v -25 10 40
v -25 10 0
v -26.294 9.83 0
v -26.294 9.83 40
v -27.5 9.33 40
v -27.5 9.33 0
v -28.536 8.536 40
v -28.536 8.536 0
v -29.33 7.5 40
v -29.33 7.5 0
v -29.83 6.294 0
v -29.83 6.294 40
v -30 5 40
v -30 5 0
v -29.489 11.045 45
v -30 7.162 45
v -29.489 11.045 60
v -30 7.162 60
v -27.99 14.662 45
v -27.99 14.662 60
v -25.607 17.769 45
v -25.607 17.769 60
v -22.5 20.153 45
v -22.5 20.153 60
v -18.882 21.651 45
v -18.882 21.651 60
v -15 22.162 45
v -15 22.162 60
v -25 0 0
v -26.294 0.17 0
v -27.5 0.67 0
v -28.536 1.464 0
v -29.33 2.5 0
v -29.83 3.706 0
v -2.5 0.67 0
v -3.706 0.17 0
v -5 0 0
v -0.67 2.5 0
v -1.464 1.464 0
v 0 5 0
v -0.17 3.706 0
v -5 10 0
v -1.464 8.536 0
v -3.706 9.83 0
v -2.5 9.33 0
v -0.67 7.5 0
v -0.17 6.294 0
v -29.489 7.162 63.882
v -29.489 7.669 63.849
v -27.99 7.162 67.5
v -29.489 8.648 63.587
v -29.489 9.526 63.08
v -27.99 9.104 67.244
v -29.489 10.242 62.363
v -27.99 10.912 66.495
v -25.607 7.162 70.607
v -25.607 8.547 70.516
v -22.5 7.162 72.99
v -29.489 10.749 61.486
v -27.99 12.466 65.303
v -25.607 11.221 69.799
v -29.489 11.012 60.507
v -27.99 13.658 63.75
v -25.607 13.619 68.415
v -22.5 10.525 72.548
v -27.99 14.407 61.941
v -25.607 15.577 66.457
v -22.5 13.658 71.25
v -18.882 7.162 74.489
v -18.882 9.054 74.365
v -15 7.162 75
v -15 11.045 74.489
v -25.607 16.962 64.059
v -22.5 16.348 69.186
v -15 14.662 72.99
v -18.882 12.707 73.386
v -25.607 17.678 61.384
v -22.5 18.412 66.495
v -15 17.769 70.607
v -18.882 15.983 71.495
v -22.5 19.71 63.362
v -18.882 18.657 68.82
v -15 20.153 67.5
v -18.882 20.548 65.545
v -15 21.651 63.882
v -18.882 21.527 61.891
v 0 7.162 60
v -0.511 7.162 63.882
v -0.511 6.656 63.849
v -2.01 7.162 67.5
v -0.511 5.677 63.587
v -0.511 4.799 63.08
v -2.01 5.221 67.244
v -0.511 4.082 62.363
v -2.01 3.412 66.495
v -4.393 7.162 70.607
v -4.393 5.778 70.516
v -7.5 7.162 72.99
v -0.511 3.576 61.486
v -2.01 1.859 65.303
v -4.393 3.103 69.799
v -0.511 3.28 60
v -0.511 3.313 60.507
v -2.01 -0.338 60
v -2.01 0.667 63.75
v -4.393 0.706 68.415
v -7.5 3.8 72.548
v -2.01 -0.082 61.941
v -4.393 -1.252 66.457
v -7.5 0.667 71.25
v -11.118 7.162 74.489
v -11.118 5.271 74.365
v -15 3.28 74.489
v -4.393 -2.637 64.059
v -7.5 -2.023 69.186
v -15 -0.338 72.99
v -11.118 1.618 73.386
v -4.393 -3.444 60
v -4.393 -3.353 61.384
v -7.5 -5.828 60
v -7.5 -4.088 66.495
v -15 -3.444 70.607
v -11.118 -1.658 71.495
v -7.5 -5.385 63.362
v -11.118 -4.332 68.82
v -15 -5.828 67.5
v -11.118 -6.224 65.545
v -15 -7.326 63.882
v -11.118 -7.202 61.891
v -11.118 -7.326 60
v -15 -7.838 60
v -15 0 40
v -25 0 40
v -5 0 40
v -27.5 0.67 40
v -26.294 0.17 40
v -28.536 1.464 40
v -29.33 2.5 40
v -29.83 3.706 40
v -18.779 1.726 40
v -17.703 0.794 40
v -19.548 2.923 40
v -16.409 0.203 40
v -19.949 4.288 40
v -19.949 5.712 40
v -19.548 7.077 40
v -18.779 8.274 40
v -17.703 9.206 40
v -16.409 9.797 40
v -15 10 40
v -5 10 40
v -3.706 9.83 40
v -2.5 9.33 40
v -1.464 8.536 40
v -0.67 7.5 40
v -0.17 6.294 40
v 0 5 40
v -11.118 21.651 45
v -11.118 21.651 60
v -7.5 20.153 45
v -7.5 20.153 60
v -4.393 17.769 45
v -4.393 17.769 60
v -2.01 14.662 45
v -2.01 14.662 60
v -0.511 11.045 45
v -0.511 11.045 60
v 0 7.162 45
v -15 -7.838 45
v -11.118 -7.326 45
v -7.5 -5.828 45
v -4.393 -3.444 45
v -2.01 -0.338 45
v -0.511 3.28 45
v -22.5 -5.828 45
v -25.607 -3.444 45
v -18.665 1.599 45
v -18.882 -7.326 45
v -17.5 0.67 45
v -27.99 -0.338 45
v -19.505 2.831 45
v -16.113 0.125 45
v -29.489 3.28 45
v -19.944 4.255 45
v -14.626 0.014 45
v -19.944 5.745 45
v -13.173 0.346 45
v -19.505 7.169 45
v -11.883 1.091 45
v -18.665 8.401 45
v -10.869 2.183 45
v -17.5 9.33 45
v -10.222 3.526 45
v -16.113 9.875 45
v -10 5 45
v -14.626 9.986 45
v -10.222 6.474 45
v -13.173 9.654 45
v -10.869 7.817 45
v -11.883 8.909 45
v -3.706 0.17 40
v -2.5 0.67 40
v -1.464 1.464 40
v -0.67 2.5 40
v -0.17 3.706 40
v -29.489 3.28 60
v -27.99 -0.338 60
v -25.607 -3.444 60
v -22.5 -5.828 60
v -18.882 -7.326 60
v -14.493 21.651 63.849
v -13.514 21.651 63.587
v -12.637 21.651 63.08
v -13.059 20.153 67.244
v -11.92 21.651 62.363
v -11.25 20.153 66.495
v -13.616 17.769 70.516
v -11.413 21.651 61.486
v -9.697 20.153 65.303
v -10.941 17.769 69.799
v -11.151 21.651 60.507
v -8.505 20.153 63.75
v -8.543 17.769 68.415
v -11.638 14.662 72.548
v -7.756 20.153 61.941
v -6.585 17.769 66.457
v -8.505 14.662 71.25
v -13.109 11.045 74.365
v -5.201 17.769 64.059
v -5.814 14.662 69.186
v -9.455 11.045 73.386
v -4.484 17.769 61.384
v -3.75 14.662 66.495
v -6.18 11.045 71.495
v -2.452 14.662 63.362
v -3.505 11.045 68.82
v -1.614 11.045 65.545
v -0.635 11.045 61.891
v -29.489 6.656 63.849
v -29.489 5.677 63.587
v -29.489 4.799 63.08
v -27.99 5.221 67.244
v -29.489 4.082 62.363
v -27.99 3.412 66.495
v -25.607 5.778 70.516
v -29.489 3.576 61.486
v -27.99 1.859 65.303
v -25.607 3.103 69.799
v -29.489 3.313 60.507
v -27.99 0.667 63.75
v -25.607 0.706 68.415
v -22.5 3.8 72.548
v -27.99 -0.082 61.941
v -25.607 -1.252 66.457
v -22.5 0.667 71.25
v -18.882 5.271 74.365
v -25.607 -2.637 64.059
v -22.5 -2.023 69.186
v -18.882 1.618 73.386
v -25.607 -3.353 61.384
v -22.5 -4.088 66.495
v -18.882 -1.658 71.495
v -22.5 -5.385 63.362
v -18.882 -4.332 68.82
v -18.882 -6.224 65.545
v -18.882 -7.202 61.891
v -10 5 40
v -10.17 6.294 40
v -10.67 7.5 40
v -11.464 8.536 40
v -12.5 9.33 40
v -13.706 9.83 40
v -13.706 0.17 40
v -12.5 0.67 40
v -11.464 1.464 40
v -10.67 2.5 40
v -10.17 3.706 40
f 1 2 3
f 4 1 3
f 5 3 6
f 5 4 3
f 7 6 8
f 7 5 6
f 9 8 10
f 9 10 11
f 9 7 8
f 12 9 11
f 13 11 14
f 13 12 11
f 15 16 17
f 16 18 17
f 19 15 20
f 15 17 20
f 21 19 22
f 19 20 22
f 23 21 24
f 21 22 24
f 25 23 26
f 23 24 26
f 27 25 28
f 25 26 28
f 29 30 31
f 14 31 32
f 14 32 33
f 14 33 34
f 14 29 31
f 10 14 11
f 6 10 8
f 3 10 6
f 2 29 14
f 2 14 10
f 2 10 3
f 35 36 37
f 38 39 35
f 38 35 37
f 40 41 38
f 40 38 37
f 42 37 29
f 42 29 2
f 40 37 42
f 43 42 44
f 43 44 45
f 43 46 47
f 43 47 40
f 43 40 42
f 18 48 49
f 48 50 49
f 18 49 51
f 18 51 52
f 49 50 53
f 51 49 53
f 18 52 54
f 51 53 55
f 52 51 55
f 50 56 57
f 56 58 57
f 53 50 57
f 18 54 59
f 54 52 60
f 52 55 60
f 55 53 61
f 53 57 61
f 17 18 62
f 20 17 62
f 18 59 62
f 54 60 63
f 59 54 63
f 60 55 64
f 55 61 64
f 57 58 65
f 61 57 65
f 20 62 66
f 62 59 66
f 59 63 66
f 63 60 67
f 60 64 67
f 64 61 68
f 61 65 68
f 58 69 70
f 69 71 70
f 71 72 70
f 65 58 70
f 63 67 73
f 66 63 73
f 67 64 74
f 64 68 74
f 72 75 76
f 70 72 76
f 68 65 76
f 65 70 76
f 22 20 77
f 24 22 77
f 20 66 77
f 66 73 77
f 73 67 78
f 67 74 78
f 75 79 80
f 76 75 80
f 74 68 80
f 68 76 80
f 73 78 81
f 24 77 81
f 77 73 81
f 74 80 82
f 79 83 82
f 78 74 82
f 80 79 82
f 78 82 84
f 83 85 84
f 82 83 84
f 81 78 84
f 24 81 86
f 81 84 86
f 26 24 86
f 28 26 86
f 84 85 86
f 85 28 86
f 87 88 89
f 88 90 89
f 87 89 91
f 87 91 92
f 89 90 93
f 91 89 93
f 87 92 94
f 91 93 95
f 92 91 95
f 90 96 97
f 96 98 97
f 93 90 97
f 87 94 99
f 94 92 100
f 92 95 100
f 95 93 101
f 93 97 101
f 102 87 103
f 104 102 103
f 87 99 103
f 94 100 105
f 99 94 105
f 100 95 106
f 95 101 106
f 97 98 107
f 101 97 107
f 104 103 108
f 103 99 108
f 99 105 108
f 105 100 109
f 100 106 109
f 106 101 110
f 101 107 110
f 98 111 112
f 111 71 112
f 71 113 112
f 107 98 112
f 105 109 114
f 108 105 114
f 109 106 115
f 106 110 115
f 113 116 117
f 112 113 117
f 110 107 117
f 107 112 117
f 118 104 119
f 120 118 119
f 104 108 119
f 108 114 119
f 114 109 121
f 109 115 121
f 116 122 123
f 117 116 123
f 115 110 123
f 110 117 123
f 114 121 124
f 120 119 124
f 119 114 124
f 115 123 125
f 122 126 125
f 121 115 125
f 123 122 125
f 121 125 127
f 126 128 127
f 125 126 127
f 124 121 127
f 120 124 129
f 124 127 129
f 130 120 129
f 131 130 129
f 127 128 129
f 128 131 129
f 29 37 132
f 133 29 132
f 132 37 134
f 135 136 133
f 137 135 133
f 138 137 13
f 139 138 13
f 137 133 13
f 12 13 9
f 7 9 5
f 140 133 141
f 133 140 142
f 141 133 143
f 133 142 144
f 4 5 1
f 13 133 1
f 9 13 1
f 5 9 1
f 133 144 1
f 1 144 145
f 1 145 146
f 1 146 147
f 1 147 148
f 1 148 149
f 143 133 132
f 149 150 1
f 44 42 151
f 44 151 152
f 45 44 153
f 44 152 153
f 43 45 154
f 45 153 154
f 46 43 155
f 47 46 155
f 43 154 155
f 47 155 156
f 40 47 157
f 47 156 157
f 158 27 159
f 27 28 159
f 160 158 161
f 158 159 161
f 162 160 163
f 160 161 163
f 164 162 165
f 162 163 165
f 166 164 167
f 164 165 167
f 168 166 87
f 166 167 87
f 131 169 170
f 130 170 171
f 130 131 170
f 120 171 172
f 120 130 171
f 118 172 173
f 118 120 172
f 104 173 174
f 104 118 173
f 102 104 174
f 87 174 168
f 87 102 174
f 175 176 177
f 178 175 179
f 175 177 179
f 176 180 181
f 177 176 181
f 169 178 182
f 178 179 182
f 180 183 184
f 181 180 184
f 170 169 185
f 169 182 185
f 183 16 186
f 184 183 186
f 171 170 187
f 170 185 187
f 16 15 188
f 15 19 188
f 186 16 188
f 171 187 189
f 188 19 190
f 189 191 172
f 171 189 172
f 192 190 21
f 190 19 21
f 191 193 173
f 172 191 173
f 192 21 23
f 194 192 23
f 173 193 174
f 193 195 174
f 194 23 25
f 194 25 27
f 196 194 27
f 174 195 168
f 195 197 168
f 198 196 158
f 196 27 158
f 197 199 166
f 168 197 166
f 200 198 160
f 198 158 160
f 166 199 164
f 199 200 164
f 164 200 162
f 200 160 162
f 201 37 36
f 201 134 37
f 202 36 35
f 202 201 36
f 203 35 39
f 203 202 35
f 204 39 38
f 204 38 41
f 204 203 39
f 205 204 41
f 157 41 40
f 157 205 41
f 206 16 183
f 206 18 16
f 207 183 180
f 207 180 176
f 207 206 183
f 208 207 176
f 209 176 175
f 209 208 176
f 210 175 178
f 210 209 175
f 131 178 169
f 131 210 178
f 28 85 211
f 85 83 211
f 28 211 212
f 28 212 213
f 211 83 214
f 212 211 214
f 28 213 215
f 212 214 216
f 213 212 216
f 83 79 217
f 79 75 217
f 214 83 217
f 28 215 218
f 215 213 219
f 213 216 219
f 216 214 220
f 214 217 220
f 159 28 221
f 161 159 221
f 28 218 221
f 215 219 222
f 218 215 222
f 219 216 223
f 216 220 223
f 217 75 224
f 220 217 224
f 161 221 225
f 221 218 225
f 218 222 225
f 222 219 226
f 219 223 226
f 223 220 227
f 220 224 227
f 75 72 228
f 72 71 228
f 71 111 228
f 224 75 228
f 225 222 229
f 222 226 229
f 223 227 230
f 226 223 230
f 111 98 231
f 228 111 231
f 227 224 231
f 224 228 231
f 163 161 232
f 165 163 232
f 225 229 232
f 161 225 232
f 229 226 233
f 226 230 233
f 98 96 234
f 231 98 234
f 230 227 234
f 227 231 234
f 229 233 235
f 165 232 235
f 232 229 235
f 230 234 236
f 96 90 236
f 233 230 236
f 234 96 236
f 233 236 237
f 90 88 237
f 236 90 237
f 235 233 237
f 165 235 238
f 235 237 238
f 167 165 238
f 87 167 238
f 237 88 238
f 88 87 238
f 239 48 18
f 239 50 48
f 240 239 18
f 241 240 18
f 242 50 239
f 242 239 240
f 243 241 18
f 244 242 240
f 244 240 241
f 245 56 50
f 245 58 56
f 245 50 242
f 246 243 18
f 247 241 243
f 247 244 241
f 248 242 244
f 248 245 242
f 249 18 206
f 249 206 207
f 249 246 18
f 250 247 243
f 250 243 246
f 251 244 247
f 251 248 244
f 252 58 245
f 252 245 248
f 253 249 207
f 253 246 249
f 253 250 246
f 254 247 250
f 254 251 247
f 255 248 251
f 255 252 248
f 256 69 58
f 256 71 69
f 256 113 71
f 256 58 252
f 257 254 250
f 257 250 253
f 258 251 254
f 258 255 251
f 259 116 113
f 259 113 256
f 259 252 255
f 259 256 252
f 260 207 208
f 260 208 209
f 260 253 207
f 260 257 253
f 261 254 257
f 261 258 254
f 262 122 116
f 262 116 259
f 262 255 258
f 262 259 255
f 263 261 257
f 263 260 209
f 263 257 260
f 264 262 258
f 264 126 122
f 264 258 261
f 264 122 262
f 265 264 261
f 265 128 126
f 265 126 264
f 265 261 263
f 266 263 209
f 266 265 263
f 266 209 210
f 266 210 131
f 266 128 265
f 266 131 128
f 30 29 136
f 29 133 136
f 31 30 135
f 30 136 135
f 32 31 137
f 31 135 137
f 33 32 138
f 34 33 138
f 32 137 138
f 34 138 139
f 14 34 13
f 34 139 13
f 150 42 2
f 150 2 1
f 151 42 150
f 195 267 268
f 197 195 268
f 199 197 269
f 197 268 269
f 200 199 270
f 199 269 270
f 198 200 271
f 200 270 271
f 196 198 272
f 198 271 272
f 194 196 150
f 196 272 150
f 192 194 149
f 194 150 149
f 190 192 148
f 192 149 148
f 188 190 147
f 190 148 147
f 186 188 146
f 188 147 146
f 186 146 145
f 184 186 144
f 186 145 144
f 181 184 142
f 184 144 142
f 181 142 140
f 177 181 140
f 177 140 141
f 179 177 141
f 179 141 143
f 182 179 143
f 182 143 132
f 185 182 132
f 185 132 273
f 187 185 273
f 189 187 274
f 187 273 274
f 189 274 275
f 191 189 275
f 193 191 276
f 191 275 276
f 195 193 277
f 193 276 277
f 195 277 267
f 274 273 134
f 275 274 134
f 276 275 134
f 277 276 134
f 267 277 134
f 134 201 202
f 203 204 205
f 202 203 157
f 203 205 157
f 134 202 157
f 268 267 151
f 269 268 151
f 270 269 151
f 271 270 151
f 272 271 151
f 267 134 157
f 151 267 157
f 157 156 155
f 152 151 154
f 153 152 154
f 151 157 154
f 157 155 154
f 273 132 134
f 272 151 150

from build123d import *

# Parameters (mm, degrees)
F0_W     = 10
F0_H     = 40
F1_DEPTH = 30
F2_R     = 4.99999
F3_R     = 5
F4_DEPTH = 5
F5_W     = 30
F5_H     = 30
F6_DEPTH = 30
F7_R     = 14.99999


# Not quite as in the source:
# - a fillet or chamfer is up to 0.001 mm smaller than in the source, because OpenCascade refuses the exact size


with BuildPart() as f1:
    # F0 (on Right) → F1 (new body)
    with BuildSketch(Plane.YZ):
        with Locations((5, 20)):
            Rectangle(F0_W, F0_H)
    extrude(amount=-F1_DEPTH)

    # F2 (radius 5 in the source; OpenCascade refuses exactly that, so slightly less here)
    f2_edges = [f1.edges().sort_by_distance(p)[0] for p in [
        (0, 10, 20),
        (0, 0, 20),
        (-30, 10, 20),
        (-30, 0, 20),
    ]]
    fillet(f2_edges, radius=F2_R)

    # F3 (on face) → F4 (join)
    with BuildSketch(Plane.XY.offset(40)):
        with Locations((-15, 5)):
            Circle(F3_R)
    extrude(amount=F4_DEPTH)

    # F5 (on face) → F6 (join)
    with BuildSketch(Plane.XY.offset(45)):
        with Locations((-15, 7.1624371922)):
            Rectangle(F5_W, F5_H)
    extrude(amount=F6_DEPTH)

    # F7 (radius 15 in the source; OpenCascade refuses exactly that, so slightly less here)
    f7_edges = [f1.edges().sort_by_distance(p)[0] for p in [
        (-15, -7.837563, 75),
        (0, 7.162437, 75),
        (-15, 22.162437, 75),
        (-30, 7.162437, 75),
        (-30, 22.162437, 60),
        (0, 22.162437, 60),
        (0, -7.837563, 60),
        (-30, -7.837563, 60),
    ]]
    fillet(f7_edges, radius=F7_R)


solid = f1.part
